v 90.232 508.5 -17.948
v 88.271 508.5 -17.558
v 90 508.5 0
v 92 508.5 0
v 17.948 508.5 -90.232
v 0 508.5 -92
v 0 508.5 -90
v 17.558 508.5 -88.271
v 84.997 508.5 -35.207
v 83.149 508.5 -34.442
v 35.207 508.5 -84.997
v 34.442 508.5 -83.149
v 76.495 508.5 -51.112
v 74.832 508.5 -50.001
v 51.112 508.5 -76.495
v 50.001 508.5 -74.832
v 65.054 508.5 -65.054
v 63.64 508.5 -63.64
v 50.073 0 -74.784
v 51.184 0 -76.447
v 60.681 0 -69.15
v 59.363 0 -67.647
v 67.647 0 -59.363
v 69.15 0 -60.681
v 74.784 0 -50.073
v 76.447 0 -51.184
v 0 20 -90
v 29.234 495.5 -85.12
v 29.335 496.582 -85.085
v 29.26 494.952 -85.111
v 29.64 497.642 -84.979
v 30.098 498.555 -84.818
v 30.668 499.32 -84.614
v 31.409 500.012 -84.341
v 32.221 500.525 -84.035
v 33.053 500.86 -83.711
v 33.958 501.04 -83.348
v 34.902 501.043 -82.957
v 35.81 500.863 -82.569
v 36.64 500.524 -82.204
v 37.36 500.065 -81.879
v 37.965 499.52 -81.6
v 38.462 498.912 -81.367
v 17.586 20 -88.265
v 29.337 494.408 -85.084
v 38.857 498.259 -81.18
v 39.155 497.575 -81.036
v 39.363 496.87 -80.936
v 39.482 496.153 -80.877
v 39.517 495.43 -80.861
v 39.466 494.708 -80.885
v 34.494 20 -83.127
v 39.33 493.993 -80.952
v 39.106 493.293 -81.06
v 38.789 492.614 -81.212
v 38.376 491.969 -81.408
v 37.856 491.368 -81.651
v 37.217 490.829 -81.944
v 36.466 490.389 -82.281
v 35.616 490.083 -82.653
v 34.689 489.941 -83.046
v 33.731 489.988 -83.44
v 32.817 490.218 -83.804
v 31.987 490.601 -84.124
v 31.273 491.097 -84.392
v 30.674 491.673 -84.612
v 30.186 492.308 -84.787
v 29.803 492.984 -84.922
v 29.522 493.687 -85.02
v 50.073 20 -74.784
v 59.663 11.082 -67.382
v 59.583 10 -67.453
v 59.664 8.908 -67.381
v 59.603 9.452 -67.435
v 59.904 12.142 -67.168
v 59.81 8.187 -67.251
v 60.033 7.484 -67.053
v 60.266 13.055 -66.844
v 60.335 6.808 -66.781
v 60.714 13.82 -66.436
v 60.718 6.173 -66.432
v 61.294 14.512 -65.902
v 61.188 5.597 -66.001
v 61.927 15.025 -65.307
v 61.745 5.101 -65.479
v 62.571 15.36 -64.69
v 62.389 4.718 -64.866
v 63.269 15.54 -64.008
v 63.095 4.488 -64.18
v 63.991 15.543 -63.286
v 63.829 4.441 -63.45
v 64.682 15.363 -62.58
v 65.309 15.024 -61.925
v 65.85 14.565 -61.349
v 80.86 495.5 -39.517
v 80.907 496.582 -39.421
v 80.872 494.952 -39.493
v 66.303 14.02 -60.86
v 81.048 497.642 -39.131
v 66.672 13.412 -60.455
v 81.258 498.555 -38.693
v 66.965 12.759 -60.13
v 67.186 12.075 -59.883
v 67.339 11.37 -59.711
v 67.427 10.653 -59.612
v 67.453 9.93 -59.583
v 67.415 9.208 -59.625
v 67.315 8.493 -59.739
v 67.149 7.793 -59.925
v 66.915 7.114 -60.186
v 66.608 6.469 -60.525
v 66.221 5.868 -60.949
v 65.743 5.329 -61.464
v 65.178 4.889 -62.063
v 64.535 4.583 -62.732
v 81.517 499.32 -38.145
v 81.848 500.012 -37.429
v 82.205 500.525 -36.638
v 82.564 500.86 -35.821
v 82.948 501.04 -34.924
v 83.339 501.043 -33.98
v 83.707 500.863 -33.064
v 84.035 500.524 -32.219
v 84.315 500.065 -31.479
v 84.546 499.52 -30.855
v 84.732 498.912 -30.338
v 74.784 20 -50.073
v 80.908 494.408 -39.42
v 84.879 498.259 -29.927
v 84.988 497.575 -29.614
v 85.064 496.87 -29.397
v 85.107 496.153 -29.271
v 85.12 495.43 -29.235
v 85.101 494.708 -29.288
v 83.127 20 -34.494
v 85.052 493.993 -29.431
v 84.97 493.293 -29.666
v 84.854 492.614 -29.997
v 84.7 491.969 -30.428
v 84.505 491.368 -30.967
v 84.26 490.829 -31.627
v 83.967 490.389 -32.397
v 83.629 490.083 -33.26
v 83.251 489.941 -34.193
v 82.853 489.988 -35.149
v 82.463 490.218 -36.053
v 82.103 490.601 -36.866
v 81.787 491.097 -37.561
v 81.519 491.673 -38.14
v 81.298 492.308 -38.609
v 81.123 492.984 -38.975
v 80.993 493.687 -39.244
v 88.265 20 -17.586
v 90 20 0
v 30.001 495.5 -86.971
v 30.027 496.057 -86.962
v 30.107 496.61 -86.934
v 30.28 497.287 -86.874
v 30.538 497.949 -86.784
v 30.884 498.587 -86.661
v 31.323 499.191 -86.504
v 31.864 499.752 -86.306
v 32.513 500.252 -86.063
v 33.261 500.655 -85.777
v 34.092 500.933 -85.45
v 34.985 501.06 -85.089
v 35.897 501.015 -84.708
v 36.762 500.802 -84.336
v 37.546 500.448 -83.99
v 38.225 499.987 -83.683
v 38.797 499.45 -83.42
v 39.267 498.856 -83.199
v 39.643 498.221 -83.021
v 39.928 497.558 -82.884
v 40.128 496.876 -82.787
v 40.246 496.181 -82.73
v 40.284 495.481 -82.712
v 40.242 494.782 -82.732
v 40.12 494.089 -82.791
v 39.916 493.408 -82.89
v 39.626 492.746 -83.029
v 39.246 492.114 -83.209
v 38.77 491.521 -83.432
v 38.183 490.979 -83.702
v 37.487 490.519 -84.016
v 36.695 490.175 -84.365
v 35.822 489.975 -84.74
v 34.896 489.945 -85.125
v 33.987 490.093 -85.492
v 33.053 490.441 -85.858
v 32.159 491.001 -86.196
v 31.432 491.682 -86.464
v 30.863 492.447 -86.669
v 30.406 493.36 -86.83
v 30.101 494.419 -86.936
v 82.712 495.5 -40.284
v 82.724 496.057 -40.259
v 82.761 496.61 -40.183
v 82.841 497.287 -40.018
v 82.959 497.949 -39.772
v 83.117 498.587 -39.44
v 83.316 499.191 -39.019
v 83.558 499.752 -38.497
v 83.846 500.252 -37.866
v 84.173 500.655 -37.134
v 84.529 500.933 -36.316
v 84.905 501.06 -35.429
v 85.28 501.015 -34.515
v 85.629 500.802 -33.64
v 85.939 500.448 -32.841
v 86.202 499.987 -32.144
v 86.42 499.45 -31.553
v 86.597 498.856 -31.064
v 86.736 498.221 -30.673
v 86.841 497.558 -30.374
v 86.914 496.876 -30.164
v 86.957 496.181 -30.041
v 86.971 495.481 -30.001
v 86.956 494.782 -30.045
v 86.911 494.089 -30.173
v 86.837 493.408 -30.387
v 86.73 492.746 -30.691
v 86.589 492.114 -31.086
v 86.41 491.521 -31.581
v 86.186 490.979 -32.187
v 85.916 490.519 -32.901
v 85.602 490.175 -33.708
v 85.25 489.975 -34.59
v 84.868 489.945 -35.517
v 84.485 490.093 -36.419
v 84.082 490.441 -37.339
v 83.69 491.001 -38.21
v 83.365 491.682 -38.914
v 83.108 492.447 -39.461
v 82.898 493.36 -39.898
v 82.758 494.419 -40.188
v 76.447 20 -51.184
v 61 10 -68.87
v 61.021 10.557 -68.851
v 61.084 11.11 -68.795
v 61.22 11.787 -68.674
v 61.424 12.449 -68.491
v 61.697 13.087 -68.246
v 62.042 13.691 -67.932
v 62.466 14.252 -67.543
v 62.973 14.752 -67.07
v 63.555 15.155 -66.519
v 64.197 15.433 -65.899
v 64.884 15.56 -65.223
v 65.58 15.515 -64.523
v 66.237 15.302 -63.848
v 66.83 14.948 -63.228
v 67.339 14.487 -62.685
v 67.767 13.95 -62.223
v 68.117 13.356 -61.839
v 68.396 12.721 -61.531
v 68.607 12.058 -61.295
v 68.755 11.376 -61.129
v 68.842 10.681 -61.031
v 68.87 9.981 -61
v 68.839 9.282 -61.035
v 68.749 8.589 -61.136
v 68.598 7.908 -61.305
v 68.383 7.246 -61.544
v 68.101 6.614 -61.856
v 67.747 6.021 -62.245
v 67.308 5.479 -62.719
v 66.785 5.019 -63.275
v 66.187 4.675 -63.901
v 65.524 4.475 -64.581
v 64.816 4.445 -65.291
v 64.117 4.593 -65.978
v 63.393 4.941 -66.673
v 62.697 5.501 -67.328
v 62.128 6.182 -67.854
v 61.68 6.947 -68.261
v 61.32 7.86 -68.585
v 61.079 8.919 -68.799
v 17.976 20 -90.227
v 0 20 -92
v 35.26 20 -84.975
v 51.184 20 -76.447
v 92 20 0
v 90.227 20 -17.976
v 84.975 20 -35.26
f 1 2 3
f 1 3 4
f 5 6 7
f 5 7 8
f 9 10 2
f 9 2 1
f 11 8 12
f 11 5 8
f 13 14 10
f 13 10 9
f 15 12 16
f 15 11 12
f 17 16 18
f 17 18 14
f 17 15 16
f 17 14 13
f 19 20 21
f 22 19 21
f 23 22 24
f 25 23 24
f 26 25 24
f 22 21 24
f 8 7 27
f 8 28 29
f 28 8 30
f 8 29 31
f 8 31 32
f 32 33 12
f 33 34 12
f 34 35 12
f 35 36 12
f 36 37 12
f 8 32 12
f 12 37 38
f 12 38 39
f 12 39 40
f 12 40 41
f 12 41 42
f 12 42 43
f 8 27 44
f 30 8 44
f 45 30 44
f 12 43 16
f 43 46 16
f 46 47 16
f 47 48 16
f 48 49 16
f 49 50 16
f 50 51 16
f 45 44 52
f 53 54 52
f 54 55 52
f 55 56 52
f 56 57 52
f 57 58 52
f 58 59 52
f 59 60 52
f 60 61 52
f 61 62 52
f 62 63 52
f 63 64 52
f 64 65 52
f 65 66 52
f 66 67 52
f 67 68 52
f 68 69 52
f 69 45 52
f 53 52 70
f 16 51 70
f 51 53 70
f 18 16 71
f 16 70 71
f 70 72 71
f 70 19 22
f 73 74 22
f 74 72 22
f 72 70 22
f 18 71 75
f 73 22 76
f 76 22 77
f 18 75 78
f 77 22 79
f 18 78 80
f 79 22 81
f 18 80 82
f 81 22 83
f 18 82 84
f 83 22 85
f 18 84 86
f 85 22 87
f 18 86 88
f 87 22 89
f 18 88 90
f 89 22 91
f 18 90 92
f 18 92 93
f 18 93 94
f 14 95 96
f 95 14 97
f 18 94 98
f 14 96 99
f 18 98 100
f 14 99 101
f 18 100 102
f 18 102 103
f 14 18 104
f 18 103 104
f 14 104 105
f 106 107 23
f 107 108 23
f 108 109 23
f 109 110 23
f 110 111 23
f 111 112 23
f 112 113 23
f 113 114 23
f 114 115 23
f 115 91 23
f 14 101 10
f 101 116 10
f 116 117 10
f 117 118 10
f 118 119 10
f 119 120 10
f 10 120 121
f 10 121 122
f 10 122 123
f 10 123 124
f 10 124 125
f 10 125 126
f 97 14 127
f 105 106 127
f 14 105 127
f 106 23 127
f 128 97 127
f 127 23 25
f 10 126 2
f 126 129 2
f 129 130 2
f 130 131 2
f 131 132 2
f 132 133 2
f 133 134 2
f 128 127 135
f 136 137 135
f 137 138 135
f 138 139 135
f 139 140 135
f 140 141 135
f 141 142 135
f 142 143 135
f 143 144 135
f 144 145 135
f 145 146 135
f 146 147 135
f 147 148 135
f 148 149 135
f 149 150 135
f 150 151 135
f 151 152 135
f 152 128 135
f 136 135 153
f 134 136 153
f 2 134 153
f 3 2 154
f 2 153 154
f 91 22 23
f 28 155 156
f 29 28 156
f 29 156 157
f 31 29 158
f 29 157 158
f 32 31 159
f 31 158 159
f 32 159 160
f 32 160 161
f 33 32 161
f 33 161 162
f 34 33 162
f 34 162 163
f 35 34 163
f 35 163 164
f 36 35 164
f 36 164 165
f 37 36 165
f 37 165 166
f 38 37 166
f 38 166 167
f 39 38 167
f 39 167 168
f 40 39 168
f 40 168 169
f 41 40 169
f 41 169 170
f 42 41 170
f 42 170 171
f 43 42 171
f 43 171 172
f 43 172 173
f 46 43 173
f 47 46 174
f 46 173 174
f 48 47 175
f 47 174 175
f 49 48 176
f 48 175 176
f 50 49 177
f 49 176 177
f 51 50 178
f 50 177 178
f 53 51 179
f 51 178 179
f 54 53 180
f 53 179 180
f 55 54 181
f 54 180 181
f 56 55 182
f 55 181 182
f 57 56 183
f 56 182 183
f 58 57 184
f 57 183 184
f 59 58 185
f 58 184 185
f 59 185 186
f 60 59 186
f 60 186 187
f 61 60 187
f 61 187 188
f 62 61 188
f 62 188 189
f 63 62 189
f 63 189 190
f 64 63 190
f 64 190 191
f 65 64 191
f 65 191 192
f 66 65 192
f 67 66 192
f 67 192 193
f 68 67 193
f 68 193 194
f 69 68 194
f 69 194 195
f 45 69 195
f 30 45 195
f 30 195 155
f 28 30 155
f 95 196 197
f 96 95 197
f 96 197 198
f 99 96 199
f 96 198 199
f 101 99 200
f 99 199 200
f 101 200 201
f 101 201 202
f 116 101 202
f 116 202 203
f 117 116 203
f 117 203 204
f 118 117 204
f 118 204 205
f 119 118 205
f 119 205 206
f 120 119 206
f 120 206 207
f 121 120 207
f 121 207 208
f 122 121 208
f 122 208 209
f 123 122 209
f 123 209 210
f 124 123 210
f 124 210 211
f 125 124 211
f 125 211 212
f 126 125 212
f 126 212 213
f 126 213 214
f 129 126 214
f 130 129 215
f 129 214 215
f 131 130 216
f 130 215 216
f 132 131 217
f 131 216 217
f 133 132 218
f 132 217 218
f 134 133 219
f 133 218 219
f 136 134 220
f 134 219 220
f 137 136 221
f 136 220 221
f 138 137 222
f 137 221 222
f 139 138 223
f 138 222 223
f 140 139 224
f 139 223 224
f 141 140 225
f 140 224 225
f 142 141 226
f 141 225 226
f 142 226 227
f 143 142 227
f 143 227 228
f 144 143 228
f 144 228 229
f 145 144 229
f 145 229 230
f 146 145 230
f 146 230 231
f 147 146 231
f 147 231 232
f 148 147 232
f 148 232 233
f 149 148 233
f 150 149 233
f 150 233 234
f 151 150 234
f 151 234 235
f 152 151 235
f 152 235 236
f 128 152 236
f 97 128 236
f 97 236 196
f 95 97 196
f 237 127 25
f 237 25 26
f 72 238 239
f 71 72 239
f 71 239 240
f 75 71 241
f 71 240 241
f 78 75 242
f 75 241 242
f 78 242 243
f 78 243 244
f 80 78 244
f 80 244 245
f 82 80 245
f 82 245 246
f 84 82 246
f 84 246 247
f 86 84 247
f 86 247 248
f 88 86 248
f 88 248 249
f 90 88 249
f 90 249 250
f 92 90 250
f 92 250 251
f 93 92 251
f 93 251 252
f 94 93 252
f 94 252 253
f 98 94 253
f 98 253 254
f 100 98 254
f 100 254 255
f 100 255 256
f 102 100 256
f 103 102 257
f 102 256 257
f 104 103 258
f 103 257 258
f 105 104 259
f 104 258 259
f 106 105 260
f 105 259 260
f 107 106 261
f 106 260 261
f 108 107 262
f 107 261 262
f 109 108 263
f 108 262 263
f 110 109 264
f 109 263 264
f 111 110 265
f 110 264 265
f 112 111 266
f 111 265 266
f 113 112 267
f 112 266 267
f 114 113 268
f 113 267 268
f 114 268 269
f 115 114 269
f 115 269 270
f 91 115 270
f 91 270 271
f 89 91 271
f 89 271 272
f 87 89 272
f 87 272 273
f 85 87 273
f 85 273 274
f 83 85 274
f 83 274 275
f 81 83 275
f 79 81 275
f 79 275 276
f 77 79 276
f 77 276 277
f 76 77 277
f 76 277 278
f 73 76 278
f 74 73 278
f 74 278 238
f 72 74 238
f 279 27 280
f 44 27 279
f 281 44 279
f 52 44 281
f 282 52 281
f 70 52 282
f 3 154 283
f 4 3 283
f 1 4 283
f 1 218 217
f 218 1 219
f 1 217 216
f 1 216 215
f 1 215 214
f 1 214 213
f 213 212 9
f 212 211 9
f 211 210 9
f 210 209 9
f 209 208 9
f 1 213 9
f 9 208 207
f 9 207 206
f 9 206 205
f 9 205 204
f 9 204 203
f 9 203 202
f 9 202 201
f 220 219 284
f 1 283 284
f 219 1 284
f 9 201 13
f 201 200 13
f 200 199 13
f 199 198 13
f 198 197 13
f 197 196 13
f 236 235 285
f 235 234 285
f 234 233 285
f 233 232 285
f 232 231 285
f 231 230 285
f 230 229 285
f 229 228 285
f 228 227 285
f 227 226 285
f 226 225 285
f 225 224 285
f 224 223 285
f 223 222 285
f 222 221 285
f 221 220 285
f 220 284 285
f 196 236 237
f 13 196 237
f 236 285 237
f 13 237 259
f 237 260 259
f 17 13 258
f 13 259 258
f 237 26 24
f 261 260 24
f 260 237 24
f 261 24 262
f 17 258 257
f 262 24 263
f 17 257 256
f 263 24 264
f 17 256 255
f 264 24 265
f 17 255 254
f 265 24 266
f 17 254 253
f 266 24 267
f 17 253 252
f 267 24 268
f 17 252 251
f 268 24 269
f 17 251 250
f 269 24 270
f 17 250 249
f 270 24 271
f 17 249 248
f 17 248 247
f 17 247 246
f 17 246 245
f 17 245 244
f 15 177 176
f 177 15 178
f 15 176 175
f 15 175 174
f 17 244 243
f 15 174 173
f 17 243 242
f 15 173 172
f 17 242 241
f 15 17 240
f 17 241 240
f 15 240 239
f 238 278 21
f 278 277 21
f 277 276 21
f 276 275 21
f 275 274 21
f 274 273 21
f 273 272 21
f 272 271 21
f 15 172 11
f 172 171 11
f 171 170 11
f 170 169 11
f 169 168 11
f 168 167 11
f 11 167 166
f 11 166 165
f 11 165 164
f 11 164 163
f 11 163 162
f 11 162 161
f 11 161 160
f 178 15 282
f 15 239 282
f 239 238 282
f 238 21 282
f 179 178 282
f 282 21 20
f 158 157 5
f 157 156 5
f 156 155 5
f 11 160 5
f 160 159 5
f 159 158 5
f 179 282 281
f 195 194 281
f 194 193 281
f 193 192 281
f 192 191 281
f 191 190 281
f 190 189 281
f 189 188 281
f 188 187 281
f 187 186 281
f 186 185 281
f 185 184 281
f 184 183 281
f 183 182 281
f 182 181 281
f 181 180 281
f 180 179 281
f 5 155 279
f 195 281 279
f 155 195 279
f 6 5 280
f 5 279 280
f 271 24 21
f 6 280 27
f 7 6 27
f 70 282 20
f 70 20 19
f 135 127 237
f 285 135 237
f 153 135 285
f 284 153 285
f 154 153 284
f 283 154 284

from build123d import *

# Parameters (mm, degrees)
BOSS_EXTRUDE1_DEPTH     = 508.5
CUT_EXTRUDE4_REACH      = 518.756
CUT_EXTRUDE4_END_RADIUS = 90
SKETCH6_R               = 5.565
CUT_EXTRUDE2_REACH      = 520.673
CUT_EXTRUDE2_END_RADIUS = 90
SKETCH3_R               = 5.565
CUT_EXTRUDE3_REACH      = 520.673
CUT_EXTRUDE3_END_RADIUS = 90
SKETCH5_R               = 5.565
LPATTERN2_COUNT         = 2
LPATTERN2_PITCH         = 485.5
CUT_EXTRUDE5_DEPTH      = 20


with BuildPart() as part:
    # Sketch1 → Boss-Extrude1 (new body)
    with BuildSketch(Plane(origin=(0, 0, 0), x_dir=(1, 0, 0), z_dir=(0, 1, 0))):
        with BuildLine():
            Line((0, 92), (0, 90))
            ThreePointArc((0, 90), (63.639610307, 63.639610307), (90, 0))
            Line((90, 0), (92, 0))
            ThreePointArc((92, 0), (65.053823869, 65.053823869), (0, 92))
        make_face()
    extrude(amount=BOSS_EXTRUDE1_DEPTH)

    # Cut-Extrude4: up to this cylinder (the profile starts outside it)
    cut_extrude4_end = Plane(origin=(0, 10, 0), z_dir=(0, -1, 0)) * Cylinder(CUT_EXTRUDE4_END_RADIUS, 1218.512, mode=Mode.PRIVATE)
    # Sketch6 → Cut-Extrude4 (cut, up to the surface)
    with BuildSketch(Plane(origin=(65.053823869, 0, -65.053823869), x_dir=(-0.7071067811865486, 0, -0.7071067811865465), z_dir=(0.7071067811865465, 0, -0.7071067811865486)), mode=Mode.PRIVATE) as cut_extrude4_sk1:
        with Locations((0, 10)):
            Circle(SKETCH6_R)
    cut_extrude4_tool1 = extrude(cut_extrude4_sk1.sketch, amount=-CUT_EXTRUDE4_REACH, mode=Mode.PRIVATE) - cut_extrude4_end
    add(cut_extrude4_tool1.solids().sort_by_distance((65.053824, 10, -65.053824))[0], mode=Mode.SUBTRACT)

    # Cut-Extrude2: up to this cylinder (the profile starts outside it)
    cut_extrude2_end = Plane(origin=(0, 10, 0), z_dir=(0, -1, 0)) * Cylinder(CUT_EXTRUDE2_END_RADIUS, 1222.346, mode=Mode.PRIVATE)
    # Sketch3 → Cut-Extrude2 (cut, up to the surface)
    with BuildSketch(Plane(origin=(84.996916991, 0, -35.206875778), x_dir=(-0.38268343236509045, 0, -0.9238795325112865), z_dir=(0.9238795325112865, 0, -0.38268343236509045)), mode=Mode.PRIVATE) as cut_extrude2_sk1:
        with Locations((0, 10)):
            Circle(SKETCH3_R)
    cut_extrude2_tool1 = extrude(cut_extrude2_sk1.sketch, amount=-CUT_EXTRUDE2_REACH, mode=Mode.PRIVATE) - cut_extrude2_end
    cut_extrude2 = cut_extrude2_tool1.solids().sort_by_distance((84.996917, 10, -35.206876))[0]
    add(cut_extrude2, mode=Mode.SUBTRACT)

    # Cut-Extrude3: up to this cylinder (the profile starts outside it)
    cut_extrude3_end = Plane(origin=(0, 10, 0), z_dir=(0, -1, 0)) * Cylinder(CUT_EXTRUDE3_END_RADIUS, 1222.346, mode=Mode.PRIVATE)
    # Sketch5 → Cut-Extrude3 (cut, up to the surface)
    with BuildSketch(Plane(origin=(35.206875778, 0, -84.996916991), x_dir=(-0.9238795325112878, 0, -0.3826834323650876), z_dir=(0.3826834323650876, 0, -0.9238795325112878)), mode=Mode.PRIVATE) as cut_extrude3_sk1:
        with Locations((0, 10)):
            Circle(SKETCH5_R)
    cut_extrude3_tool1 = extrude(cut_extrude3_sk1.sketch, amount=-CUT_EXTRUDE3_REACH, mode=Mode.PRIVATE) - cut_extrude3_end
    cut_extrude3 = cut_extrude3_tool1.solids().sort_by_distance((35.206876, 10, -84.996917))[0]
    add(cut_extrude3, mode=Mode.SUBTRACT)

    # LPattern2: Cut-Extrude2, Cut-Extrude3 ×2
    with Locations(*[(0, i * LPATTERN2_PITCH, 0) for i in range(1, LPATTERN2_COUNT)]):
        add(cut_extrude2, mode=Mode.SUBTRACT)
        add(cut_extrude3, mode=Mode.SUBTRACT)

    # Sketch7 → Cut-Extrude5 (cut)
    with BuildSketch(Plane.XZ):
        with BuildLine():
            ThreePointArc((90, 0), (86.112133982, -26.166780106), (74.784435976, -50.072828318))
            Line((74.784435976, -50.072828318), (76.447375943, -51.183969281))
            ThreePointArc((76.447375943, -51.183969281), (88.026014867, -26.747349525), (92, 0))
            Line((92, 0), (90, 0))
        make_face()
        with BuildLine():
            Line((51.183969281, -76.447375943), (50.072828318, -74.784435976))
            ThreePointArc((50.072828318, -74.784435976), (26.166780106, -86.112133982), (0, -90))
            Line((0, -90), (0, -92))
            ThreePointArc((0, -92), (26.747349525, -88.026014867), (51.183969281, -76.447375943))
        make_face()
    extrude(amount=-CUT_EXTRUDE5_DEPTH, mode=Mode.SUBTRACT)


solid = part.part
